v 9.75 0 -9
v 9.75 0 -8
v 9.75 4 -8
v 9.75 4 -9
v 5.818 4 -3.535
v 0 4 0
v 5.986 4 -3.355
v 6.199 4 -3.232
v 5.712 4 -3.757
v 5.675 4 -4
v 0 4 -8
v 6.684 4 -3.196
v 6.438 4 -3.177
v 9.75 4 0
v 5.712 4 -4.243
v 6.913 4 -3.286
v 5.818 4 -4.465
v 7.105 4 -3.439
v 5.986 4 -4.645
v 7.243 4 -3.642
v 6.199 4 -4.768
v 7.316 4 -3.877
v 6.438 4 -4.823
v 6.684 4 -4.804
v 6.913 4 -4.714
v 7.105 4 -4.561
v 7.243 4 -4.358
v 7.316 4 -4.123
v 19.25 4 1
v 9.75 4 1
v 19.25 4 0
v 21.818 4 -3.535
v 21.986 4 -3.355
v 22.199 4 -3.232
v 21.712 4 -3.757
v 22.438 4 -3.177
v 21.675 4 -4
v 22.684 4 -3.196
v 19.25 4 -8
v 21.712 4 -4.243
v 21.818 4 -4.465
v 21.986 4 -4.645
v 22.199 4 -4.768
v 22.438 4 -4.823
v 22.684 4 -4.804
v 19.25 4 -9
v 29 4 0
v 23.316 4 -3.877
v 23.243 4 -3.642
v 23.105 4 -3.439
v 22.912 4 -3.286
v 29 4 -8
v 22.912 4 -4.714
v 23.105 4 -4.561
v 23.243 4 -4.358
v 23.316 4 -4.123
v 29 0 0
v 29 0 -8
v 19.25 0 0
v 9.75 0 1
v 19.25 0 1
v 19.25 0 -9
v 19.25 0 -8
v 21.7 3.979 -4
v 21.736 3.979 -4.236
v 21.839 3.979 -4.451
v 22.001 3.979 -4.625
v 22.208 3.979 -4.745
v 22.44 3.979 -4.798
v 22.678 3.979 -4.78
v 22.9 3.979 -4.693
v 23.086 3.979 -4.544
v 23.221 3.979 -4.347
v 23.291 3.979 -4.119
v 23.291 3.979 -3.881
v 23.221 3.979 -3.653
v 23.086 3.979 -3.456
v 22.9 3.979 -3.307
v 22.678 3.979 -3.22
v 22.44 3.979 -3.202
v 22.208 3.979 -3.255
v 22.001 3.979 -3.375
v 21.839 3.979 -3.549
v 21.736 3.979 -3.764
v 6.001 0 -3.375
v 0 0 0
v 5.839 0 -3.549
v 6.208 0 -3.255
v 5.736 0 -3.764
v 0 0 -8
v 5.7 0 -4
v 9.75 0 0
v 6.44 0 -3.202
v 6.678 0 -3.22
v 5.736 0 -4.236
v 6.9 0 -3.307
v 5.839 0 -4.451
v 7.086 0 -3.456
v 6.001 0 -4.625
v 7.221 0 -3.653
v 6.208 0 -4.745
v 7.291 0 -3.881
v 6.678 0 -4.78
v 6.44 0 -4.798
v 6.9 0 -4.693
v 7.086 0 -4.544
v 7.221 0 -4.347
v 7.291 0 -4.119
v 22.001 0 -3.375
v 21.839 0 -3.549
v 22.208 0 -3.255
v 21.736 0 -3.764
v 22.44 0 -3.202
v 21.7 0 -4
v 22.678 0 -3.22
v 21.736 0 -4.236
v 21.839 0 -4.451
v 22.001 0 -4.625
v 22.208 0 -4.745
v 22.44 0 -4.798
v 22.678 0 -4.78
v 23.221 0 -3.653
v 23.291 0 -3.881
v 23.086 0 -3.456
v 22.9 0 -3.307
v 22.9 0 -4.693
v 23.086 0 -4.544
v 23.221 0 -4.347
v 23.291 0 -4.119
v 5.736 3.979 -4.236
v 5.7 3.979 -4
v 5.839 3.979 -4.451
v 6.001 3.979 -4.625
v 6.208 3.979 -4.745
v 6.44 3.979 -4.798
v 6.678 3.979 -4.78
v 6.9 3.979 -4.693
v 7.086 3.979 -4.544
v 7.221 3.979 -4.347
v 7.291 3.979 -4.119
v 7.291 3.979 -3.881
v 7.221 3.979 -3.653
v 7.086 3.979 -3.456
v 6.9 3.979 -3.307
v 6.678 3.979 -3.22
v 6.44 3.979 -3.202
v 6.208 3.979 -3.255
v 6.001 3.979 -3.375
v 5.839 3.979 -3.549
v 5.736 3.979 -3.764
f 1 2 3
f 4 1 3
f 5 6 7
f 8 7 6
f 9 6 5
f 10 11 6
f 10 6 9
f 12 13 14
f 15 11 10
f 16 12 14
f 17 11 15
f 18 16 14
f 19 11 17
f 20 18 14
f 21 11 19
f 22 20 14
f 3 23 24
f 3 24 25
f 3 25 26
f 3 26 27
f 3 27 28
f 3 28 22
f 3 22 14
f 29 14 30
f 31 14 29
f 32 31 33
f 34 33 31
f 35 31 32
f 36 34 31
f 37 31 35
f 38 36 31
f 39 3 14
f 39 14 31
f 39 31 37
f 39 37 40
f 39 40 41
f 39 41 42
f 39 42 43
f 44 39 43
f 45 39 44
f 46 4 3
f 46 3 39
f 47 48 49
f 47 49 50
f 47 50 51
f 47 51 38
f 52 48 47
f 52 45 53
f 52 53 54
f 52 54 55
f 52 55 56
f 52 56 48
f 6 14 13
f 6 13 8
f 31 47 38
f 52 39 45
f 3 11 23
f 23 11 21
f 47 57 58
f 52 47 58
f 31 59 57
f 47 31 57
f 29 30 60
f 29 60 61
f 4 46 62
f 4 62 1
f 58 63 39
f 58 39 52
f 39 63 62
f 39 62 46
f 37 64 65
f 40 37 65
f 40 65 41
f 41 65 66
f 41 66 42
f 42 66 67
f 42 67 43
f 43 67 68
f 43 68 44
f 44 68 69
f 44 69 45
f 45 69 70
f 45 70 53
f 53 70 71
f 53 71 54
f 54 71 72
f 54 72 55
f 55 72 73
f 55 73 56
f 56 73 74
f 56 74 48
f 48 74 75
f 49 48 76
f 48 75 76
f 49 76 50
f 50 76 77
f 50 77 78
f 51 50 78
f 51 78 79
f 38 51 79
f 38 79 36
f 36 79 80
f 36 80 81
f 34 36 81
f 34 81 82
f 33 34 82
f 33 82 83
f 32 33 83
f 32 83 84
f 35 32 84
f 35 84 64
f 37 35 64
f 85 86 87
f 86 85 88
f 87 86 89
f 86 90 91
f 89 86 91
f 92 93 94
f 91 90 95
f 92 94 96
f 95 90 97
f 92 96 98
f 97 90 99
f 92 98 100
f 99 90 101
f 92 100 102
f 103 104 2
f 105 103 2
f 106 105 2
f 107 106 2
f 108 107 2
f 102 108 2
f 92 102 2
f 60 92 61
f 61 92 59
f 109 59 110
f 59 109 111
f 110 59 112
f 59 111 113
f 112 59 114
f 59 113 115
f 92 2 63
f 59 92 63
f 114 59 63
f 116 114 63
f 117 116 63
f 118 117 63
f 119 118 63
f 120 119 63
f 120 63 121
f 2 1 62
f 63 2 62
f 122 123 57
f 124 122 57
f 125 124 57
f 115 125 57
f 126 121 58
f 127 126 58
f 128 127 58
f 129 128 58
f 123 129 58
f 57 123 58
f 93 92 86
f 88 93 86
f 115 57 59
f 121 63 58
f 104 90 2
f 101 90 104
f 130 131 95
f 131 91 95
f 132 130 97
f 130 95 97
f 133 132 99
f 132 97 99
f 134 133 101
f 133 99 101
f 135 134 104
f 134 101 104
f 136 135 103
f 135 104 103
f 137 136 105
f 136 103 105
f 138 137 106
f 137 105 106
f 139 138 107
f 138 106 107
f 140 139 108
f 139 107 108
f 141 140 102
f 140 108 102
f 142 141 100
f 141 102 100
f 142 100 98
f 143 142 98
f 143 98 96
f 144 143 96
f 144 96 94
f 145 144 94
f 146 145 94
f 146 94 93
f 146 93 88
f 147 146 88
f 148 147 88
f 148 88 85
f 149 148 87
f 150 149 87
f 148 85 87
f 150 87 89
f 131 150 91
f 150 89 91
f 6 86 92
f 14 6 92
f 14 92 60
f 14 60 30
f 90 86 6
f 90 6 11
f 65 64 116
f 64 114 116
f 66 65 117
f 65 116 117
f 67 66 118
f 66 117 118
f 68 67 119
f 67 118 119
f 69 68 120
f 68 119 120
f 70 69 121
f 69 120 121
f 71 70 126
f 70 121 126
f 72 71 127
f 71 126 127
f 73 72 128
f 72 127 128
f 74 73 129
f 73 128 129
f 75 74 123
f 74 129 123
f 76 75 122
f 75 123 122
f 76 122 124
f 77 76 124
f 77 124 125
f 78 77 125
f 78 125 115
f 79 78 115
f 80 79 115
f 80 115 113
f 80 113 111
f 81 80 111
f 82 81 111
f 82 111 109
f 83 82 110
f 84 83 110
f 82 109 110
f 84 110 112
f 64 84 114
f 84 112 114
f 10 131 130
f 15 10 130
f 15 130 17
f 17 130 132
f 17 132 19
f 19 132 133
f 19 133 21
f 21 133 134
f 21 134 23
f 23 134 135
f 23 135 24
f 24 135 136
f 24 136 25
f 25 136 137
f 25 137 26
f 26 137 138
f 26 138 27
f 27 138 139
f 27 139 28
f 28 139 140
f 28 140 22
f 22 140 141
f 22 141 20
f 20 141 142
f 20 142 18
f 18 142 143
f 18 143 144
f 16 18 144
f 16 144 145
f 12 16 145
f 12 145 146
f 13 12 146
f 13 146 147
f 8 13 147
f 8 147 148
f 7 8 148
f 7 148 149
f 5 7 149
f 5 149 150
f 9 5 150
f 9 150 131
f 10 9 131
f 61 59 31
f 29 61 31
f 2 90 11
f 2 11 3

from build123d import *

# Parameters (mm, degrees)
SKETCH1_W                         = 29
SKETCH1_H                         = 8
BOSS_EXTRUDE1_DEPTH               = 4
SKETCH2_W                         = 9.5
SKETCH2_H                         = 4
BOSS_EXTRUDE2_DEPTH               = 1
SKETCH3_W                         = 9.5
SKETCH3_H                         = 4
BOSS_EXTRUDE3_DEPTH               = 1
TAP_DRILL_FOR_M2_TAP1_D           = 1.6
TAP_DRILL_FOR_M2_TAP1_CSINK_D     = 1.65
TAP_DRILL_FOR_M2_TAP1_CSINK_ANGLE = 100


with BuildPart() as part:
    # Sketch1 → Boss-Extrude1 (new body)
    with BuildSketch(Plane(origin=(0, 0, 0), x_dir=(1, 0, 0), z_dir=(0, 1, 0))):
        with Locations((14.5, 4)):
            Rectangle(SKETCH1_W, SKETCH1_H)
    extrude(amount=BOSS_EXTRUDE1_DEPTH)

    # Sketch2 → Boss-Extrude2 (add)
    with BuildSketch(Plane.XY):
        with Locations((14.5, 2)):
            Rectangle(SKETCH2_W, SKETCH2_H)
    extrude(amount=BOSS_EXTRUDE2_DEPTH)

    # Sketch3 → Boss-Extrude3 (add)
    with BuildSketch(Plane(origin=(0, 0, -8), x_dir=(-1, 0, 0), z_dir=(0, 0, -1))):
        with Locations((-14.5, 2)):
            Rectangle(SKETCH3_W, SKETCH3_H)
    extrude(amount=BOSS_EXTRUDE3_DEPTH)

    # Tap Drill for M2 Tap1 (through all)
    with Locations(Plane(origin=(0, 4, 0), x_dir=(1, 0, 0), z_dir=(0, 1, 0))):
        with Locations((6.5, 4), (22.5, 4)):
            CounterSinkHole(TAP_DRILL_FOR_M2_TAP1_D / 2, TAP_DRILL_FOR_M2_TAP1_CSINK_D / 2, counter_sink_angle=TAP_DRILL_FOR_M2_TAP1_CSINK_ANGLE)


solid = part.part
